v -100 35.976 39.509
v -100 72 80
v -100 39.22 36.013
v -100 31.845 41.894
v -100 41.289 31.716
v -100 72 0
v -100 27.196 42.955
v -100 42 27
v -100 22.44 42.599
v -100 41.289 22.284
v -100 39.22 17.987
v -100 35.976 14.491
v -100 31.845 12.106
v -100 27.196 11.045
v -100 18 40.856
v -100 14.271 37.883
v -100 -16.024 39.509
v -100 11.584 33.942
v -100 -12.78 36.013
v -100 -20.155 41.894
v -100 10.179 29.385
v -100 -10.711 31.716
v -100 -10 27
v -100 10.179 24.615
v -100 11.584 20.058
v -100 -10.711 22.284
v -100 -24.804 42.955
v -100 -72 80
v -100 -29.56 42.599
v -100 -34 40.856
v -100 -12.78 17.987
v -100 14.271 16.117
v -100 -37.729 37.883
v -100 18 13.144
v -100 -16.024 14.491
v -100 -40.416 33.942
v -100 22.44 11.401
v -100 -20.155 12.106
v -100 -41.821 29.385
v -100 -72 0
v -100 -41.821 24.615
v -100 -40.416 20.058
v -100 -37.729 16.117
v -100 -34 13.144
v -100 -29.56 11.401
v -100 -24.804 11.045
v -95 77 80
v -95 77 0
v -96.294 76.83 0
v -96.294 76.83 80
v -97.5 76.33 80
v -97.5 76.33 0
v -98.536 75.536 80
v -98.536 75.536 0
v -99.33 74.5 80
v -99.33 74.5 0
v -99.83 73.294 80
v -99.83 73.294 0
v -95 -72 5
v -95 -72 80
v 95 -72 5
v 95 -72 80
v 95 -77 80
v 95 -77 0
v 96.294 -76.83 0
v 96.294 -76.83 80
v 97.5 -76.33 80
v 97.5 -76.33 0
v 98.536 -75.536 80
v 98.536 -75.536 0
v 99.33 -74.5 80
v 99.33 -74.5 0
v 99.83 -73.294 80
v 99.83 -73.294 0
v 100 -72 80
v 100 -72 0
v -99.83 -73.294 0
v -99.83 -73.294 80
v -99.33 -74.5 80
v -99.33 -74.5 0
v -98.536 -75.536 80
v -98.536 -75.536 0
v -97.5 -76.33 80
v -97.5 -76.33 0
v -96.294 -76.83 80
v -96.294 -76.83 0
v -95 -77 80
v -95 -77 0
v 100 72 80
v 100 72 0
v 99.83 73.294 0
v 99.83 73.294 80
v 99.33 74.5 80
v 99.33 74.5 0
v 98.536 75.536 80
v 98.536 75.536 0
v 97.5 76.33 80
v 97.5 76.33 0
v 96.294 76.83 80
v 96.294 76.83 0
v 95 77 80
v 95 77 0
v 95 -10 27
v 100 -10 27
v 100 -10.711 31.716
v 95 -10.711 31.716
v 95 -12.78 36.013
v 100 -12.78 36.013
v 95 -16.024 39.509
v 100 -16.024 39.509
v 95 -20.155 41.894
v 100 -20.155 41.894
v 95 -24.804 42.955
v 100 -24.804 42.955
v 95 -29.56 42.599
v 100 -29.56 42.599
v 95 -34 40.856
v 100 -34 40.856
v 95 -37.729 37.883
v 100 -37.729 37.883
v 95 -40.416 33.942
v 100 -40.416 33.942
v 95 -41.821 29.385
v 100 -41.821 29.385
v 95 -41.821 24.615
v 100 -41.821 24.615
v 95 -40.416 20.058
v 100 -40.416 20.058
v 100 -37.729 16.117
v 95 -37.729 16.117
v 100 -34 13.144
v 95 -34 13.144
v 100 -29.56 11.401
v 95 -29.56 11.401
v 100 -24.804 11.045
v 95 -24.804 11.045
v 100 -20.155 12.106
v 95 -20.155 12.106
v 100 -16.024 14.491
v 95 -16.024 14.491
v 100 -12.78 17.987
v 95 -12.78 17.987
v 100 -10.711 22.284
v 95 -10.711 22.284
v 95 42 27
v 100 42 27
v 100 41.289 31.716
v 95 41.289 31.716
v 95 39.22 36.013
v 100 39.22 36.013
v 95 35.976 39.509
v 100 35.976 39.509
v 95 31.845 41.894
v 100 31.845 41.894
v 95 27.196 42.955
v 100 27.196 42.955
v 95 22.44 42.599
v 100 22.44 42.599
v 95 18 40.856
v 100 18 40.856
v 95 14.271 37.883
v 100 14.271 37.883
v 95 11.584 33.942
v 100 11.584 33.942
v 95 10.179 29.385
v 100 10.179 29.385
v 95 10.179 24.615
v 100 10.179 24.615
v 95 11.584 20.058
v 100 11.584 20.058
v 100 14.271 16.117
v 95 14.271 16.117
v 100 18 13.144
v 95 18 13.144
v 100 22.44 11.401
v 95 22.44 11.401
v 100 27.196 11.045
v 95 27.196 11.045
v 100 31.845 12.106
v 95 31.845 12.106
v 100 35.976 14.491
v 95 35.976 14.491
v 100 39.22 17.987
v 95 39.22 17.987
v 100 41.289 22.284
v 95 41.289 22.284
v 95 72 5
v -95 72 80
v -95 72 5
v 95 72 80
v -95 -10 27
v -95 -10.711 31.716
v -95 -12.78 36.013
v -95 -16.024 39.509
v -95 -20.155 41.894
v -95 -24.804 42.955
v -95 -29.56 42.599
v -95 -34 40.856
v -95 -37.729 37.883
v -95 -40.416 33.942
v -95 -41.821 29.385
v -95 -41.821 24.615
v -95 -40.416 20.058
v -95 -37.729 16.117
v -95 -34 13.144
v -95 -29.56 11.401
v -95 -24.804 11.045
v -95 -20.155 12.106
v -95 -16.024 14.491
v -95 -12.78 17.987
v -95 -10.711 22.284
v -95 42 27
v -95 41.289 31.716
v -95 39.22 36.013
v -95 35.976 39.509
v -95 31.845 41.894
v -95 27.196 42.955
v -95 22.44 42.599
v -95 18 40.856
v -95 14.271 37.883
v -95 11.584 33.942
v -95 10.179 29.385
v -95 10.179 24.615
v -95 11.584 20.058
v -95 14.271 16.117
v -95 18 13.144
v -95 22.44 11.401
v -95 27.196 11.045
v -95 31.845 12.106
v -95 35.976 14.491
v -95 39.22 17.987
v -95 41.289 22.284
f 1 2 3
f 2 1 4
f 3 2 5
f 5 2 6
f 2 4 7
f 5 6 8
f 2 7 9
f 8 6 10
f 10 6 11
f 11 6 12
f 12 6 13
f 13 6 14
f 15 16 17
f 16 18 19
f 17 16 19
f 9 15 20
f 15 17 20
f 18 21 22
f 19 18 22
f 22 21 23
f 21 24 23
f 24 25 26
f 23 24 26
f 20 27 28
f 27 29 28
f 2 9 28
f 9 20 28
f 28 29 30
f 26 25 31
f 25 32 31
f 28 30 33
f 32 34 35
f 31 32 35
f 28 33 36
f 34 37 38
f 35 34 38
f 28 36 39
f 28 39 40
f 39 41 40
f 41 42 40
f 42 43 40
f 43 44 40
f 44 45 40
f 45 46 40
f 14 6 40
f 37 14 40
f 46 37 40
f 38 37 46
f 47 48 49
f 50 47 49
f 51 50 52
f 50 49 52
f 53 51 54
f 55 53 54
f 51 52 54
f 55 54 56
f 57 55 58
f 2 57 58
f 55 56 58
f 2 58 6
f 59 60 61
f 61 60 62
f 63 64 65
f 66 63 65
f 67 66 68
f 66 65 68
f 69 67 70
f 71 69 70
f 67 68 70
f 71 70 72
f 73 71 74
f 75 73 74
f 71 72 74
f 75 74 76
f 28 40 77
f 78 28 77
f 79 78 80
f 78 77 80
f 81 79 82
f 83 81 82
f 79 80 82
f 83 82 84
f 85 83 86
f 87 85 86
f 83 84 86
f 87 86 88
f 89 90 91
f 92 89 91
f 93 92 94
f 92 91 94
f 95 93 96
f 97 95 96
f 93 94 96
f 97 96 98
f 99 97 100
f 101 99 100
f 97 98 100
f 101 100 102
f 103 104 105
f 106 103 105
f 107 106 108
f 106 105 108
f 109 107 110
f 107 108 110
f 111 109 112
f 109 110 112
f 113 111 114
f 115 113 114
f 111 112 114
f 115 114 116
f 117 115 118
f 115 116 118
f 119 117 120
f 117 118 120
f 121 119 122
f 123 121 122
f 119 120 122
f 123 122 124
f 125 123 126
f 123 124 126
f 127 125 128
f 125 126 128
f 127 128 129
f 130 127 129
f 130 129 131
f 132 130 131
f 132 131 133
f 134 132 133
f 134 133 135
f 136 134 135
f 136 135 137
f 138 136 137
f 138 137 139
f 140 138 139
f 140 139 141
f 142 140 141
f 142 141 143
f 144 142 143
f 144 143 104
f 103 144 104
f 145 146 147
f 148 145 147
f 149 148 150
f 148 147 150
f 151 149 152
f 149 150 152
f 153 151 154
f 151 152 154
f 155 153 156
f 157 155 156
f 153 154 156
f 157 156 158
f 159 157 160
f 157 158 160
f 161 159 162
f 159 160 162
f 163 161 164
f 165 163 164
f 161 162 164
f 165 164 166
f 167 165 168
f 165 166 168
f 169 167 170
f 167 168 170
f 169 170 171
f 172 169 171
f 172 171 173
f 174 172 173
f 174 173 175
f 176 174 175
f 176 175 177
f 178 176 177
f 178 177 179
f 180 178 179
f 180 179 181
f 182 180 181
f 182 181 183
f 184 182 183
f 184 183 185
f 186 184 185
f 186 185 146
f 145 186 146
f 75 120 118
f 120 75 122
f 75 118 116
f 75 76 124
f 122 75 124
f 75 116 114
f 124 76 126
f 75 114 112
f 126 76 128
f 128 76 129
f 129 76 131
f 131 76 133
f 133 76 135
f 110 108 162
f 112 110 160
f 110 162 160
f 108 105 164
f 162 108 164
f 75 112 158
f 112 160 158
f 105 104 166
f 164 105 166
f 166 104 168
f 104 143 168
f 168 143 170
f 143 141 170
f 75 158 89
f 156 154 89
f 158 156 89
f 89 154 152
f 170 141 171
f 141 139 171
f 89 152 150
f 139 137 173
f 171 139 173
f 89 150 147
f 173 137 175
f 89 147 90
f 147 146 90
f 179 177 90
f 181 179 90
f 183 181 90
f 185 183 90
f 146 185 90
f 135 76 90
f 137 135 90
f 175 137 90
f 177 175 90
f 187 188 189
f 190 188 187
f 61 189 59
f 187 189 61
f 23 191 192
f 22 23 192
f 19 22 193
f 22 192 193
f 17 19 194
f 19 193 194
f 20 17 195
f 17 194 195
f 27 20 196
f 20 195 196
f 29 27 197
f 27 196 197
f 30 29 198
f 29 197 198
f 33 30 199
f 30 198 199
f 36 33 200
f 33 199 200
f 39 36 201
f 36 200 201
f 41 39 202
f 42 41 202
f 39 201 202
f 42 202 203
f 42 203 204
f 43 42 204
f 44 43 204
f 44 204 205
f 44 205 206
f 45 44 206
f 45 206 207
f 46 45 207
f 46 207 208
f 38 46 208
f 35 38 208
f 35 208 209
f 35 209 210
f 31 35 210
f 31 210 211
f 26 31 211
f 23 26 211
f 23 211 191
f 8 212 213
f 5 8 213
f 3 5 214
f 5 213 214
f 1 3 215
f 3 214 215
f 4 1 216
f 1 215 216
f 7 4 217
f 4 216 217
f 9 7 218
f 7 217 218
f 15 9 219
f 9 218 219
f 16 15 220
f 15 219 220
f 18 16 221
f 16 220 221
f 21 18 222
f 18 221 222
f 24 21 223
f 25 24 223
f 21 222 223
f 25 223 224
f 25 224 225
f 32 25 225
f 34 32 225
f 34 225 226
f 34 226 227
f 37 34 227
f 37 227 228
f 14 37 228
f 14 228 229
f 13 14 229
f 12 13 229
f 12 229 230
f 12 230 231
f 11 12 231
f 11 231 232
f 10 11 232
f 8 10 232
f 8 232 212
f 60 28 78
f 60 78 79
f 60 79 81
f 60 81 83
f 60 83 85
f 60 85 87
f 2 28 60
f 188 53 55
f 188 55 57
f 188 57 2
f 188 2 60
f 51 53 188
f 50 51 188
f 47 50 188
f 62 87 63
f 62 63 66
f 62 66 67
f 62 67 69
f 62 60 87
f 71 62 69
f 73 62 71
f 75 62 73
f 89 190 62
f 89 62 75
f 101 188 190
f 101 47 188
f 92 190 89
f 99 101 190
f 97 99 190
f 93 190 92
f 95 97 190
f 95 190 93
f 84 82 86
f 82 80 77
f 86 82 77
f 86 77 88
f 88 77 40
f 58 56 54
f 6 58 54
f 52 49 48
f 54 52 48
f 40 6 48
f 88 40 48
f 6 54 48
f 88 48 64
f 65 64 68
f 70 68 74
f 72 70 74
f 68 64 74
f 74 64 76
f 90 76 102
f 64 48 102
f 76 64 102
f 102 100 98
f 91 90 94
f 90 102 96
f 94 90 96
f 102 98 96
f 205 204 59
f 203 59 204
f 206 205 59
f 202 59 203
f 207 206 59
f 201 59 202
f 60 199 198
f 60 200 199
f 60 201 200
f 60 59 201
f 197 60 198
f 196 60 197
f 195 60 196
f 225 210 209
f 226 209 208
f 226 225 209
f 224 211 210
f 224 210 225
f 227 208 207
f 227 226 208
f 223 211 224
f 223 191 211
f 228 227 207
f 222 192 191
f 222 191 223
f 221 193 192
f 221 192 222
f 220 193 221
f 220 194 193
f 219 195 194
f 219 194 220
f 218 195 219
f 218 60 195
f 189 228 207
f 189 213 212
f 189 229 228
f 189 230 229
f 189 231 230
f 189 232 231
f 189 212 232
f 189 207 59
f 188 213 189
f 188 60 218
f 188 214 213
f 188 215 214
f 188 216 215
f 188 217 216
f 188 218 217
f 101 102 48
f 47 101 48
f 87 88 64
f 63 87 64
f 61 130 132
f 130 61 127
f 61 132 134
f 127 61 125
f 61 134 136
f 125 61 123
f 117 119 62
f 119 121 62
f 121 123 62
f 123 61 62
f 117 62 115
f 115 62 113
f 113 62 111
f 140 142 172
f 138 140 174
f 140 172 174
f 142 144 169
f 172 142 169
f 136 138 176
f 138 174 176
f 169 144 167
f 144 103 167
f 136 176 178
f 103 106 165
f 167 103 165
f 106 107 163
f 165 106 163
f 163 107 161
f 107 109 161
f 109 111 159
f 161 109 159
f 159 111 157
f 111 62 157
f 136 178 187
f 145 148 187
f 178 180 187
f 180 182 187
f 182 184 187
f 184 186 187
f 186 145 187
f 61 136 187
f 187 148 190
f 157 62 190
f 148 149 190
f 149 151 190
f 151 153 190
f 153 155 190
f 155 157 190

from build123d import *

# Parameters (mm, degrees)
F1_DEPTH = 80
F2_W     = 189.999994
F2_H     = 143.999994
F3_DEPTH = 75
F4_R     = 16
F5_DEPTH = 200.001


with BuildPart() as f1:
    # F0 (on Top) → F1 (new body)
    with BuildSketch(Plane.XY):
        with BuildLine():
            ThreePointArc((100, 72), (98.535534, 75.535534), (95, 77))
            Line((95, 77), (-95, 77))
            ThreePointArc((-95, 77), (-98.535534, 75.535534), (-100, 72))
            Line((-100, 72), (-100, -72))
            ThreePointArc((-100, -72), (-98.535534, -75.535534), (-95, -77))
            Line((-95, -77), (95, -77))
            ThreePointArc((95, -77), (98.535534, -75.535534), (100, -72))
            Line((100, -72), (100, 72))
        make_face()
    extrude(amount=F1_DEPTH)

    # F2 (on face) → F3 (cut)
    with BuildSketch(Plane.XY.offset(80)):
        Rectangle(F2_W, F2_H)
    extrude(amount=-F3_DEPTH, mode=Mode.SUBTRACT)

    # F4 (on face) → F5 (cut, through all)
    with BuildSketch(Plane.YZ.offset(100)):
        with Locations((26, 27)):
            Circle(F4_R)
        with Locations((-26, 27)):
            Circle(F4_R)
    extrude(amount=-F5_DEPTH, mode=Mode.SUBTRACT)


solid = f1.part
